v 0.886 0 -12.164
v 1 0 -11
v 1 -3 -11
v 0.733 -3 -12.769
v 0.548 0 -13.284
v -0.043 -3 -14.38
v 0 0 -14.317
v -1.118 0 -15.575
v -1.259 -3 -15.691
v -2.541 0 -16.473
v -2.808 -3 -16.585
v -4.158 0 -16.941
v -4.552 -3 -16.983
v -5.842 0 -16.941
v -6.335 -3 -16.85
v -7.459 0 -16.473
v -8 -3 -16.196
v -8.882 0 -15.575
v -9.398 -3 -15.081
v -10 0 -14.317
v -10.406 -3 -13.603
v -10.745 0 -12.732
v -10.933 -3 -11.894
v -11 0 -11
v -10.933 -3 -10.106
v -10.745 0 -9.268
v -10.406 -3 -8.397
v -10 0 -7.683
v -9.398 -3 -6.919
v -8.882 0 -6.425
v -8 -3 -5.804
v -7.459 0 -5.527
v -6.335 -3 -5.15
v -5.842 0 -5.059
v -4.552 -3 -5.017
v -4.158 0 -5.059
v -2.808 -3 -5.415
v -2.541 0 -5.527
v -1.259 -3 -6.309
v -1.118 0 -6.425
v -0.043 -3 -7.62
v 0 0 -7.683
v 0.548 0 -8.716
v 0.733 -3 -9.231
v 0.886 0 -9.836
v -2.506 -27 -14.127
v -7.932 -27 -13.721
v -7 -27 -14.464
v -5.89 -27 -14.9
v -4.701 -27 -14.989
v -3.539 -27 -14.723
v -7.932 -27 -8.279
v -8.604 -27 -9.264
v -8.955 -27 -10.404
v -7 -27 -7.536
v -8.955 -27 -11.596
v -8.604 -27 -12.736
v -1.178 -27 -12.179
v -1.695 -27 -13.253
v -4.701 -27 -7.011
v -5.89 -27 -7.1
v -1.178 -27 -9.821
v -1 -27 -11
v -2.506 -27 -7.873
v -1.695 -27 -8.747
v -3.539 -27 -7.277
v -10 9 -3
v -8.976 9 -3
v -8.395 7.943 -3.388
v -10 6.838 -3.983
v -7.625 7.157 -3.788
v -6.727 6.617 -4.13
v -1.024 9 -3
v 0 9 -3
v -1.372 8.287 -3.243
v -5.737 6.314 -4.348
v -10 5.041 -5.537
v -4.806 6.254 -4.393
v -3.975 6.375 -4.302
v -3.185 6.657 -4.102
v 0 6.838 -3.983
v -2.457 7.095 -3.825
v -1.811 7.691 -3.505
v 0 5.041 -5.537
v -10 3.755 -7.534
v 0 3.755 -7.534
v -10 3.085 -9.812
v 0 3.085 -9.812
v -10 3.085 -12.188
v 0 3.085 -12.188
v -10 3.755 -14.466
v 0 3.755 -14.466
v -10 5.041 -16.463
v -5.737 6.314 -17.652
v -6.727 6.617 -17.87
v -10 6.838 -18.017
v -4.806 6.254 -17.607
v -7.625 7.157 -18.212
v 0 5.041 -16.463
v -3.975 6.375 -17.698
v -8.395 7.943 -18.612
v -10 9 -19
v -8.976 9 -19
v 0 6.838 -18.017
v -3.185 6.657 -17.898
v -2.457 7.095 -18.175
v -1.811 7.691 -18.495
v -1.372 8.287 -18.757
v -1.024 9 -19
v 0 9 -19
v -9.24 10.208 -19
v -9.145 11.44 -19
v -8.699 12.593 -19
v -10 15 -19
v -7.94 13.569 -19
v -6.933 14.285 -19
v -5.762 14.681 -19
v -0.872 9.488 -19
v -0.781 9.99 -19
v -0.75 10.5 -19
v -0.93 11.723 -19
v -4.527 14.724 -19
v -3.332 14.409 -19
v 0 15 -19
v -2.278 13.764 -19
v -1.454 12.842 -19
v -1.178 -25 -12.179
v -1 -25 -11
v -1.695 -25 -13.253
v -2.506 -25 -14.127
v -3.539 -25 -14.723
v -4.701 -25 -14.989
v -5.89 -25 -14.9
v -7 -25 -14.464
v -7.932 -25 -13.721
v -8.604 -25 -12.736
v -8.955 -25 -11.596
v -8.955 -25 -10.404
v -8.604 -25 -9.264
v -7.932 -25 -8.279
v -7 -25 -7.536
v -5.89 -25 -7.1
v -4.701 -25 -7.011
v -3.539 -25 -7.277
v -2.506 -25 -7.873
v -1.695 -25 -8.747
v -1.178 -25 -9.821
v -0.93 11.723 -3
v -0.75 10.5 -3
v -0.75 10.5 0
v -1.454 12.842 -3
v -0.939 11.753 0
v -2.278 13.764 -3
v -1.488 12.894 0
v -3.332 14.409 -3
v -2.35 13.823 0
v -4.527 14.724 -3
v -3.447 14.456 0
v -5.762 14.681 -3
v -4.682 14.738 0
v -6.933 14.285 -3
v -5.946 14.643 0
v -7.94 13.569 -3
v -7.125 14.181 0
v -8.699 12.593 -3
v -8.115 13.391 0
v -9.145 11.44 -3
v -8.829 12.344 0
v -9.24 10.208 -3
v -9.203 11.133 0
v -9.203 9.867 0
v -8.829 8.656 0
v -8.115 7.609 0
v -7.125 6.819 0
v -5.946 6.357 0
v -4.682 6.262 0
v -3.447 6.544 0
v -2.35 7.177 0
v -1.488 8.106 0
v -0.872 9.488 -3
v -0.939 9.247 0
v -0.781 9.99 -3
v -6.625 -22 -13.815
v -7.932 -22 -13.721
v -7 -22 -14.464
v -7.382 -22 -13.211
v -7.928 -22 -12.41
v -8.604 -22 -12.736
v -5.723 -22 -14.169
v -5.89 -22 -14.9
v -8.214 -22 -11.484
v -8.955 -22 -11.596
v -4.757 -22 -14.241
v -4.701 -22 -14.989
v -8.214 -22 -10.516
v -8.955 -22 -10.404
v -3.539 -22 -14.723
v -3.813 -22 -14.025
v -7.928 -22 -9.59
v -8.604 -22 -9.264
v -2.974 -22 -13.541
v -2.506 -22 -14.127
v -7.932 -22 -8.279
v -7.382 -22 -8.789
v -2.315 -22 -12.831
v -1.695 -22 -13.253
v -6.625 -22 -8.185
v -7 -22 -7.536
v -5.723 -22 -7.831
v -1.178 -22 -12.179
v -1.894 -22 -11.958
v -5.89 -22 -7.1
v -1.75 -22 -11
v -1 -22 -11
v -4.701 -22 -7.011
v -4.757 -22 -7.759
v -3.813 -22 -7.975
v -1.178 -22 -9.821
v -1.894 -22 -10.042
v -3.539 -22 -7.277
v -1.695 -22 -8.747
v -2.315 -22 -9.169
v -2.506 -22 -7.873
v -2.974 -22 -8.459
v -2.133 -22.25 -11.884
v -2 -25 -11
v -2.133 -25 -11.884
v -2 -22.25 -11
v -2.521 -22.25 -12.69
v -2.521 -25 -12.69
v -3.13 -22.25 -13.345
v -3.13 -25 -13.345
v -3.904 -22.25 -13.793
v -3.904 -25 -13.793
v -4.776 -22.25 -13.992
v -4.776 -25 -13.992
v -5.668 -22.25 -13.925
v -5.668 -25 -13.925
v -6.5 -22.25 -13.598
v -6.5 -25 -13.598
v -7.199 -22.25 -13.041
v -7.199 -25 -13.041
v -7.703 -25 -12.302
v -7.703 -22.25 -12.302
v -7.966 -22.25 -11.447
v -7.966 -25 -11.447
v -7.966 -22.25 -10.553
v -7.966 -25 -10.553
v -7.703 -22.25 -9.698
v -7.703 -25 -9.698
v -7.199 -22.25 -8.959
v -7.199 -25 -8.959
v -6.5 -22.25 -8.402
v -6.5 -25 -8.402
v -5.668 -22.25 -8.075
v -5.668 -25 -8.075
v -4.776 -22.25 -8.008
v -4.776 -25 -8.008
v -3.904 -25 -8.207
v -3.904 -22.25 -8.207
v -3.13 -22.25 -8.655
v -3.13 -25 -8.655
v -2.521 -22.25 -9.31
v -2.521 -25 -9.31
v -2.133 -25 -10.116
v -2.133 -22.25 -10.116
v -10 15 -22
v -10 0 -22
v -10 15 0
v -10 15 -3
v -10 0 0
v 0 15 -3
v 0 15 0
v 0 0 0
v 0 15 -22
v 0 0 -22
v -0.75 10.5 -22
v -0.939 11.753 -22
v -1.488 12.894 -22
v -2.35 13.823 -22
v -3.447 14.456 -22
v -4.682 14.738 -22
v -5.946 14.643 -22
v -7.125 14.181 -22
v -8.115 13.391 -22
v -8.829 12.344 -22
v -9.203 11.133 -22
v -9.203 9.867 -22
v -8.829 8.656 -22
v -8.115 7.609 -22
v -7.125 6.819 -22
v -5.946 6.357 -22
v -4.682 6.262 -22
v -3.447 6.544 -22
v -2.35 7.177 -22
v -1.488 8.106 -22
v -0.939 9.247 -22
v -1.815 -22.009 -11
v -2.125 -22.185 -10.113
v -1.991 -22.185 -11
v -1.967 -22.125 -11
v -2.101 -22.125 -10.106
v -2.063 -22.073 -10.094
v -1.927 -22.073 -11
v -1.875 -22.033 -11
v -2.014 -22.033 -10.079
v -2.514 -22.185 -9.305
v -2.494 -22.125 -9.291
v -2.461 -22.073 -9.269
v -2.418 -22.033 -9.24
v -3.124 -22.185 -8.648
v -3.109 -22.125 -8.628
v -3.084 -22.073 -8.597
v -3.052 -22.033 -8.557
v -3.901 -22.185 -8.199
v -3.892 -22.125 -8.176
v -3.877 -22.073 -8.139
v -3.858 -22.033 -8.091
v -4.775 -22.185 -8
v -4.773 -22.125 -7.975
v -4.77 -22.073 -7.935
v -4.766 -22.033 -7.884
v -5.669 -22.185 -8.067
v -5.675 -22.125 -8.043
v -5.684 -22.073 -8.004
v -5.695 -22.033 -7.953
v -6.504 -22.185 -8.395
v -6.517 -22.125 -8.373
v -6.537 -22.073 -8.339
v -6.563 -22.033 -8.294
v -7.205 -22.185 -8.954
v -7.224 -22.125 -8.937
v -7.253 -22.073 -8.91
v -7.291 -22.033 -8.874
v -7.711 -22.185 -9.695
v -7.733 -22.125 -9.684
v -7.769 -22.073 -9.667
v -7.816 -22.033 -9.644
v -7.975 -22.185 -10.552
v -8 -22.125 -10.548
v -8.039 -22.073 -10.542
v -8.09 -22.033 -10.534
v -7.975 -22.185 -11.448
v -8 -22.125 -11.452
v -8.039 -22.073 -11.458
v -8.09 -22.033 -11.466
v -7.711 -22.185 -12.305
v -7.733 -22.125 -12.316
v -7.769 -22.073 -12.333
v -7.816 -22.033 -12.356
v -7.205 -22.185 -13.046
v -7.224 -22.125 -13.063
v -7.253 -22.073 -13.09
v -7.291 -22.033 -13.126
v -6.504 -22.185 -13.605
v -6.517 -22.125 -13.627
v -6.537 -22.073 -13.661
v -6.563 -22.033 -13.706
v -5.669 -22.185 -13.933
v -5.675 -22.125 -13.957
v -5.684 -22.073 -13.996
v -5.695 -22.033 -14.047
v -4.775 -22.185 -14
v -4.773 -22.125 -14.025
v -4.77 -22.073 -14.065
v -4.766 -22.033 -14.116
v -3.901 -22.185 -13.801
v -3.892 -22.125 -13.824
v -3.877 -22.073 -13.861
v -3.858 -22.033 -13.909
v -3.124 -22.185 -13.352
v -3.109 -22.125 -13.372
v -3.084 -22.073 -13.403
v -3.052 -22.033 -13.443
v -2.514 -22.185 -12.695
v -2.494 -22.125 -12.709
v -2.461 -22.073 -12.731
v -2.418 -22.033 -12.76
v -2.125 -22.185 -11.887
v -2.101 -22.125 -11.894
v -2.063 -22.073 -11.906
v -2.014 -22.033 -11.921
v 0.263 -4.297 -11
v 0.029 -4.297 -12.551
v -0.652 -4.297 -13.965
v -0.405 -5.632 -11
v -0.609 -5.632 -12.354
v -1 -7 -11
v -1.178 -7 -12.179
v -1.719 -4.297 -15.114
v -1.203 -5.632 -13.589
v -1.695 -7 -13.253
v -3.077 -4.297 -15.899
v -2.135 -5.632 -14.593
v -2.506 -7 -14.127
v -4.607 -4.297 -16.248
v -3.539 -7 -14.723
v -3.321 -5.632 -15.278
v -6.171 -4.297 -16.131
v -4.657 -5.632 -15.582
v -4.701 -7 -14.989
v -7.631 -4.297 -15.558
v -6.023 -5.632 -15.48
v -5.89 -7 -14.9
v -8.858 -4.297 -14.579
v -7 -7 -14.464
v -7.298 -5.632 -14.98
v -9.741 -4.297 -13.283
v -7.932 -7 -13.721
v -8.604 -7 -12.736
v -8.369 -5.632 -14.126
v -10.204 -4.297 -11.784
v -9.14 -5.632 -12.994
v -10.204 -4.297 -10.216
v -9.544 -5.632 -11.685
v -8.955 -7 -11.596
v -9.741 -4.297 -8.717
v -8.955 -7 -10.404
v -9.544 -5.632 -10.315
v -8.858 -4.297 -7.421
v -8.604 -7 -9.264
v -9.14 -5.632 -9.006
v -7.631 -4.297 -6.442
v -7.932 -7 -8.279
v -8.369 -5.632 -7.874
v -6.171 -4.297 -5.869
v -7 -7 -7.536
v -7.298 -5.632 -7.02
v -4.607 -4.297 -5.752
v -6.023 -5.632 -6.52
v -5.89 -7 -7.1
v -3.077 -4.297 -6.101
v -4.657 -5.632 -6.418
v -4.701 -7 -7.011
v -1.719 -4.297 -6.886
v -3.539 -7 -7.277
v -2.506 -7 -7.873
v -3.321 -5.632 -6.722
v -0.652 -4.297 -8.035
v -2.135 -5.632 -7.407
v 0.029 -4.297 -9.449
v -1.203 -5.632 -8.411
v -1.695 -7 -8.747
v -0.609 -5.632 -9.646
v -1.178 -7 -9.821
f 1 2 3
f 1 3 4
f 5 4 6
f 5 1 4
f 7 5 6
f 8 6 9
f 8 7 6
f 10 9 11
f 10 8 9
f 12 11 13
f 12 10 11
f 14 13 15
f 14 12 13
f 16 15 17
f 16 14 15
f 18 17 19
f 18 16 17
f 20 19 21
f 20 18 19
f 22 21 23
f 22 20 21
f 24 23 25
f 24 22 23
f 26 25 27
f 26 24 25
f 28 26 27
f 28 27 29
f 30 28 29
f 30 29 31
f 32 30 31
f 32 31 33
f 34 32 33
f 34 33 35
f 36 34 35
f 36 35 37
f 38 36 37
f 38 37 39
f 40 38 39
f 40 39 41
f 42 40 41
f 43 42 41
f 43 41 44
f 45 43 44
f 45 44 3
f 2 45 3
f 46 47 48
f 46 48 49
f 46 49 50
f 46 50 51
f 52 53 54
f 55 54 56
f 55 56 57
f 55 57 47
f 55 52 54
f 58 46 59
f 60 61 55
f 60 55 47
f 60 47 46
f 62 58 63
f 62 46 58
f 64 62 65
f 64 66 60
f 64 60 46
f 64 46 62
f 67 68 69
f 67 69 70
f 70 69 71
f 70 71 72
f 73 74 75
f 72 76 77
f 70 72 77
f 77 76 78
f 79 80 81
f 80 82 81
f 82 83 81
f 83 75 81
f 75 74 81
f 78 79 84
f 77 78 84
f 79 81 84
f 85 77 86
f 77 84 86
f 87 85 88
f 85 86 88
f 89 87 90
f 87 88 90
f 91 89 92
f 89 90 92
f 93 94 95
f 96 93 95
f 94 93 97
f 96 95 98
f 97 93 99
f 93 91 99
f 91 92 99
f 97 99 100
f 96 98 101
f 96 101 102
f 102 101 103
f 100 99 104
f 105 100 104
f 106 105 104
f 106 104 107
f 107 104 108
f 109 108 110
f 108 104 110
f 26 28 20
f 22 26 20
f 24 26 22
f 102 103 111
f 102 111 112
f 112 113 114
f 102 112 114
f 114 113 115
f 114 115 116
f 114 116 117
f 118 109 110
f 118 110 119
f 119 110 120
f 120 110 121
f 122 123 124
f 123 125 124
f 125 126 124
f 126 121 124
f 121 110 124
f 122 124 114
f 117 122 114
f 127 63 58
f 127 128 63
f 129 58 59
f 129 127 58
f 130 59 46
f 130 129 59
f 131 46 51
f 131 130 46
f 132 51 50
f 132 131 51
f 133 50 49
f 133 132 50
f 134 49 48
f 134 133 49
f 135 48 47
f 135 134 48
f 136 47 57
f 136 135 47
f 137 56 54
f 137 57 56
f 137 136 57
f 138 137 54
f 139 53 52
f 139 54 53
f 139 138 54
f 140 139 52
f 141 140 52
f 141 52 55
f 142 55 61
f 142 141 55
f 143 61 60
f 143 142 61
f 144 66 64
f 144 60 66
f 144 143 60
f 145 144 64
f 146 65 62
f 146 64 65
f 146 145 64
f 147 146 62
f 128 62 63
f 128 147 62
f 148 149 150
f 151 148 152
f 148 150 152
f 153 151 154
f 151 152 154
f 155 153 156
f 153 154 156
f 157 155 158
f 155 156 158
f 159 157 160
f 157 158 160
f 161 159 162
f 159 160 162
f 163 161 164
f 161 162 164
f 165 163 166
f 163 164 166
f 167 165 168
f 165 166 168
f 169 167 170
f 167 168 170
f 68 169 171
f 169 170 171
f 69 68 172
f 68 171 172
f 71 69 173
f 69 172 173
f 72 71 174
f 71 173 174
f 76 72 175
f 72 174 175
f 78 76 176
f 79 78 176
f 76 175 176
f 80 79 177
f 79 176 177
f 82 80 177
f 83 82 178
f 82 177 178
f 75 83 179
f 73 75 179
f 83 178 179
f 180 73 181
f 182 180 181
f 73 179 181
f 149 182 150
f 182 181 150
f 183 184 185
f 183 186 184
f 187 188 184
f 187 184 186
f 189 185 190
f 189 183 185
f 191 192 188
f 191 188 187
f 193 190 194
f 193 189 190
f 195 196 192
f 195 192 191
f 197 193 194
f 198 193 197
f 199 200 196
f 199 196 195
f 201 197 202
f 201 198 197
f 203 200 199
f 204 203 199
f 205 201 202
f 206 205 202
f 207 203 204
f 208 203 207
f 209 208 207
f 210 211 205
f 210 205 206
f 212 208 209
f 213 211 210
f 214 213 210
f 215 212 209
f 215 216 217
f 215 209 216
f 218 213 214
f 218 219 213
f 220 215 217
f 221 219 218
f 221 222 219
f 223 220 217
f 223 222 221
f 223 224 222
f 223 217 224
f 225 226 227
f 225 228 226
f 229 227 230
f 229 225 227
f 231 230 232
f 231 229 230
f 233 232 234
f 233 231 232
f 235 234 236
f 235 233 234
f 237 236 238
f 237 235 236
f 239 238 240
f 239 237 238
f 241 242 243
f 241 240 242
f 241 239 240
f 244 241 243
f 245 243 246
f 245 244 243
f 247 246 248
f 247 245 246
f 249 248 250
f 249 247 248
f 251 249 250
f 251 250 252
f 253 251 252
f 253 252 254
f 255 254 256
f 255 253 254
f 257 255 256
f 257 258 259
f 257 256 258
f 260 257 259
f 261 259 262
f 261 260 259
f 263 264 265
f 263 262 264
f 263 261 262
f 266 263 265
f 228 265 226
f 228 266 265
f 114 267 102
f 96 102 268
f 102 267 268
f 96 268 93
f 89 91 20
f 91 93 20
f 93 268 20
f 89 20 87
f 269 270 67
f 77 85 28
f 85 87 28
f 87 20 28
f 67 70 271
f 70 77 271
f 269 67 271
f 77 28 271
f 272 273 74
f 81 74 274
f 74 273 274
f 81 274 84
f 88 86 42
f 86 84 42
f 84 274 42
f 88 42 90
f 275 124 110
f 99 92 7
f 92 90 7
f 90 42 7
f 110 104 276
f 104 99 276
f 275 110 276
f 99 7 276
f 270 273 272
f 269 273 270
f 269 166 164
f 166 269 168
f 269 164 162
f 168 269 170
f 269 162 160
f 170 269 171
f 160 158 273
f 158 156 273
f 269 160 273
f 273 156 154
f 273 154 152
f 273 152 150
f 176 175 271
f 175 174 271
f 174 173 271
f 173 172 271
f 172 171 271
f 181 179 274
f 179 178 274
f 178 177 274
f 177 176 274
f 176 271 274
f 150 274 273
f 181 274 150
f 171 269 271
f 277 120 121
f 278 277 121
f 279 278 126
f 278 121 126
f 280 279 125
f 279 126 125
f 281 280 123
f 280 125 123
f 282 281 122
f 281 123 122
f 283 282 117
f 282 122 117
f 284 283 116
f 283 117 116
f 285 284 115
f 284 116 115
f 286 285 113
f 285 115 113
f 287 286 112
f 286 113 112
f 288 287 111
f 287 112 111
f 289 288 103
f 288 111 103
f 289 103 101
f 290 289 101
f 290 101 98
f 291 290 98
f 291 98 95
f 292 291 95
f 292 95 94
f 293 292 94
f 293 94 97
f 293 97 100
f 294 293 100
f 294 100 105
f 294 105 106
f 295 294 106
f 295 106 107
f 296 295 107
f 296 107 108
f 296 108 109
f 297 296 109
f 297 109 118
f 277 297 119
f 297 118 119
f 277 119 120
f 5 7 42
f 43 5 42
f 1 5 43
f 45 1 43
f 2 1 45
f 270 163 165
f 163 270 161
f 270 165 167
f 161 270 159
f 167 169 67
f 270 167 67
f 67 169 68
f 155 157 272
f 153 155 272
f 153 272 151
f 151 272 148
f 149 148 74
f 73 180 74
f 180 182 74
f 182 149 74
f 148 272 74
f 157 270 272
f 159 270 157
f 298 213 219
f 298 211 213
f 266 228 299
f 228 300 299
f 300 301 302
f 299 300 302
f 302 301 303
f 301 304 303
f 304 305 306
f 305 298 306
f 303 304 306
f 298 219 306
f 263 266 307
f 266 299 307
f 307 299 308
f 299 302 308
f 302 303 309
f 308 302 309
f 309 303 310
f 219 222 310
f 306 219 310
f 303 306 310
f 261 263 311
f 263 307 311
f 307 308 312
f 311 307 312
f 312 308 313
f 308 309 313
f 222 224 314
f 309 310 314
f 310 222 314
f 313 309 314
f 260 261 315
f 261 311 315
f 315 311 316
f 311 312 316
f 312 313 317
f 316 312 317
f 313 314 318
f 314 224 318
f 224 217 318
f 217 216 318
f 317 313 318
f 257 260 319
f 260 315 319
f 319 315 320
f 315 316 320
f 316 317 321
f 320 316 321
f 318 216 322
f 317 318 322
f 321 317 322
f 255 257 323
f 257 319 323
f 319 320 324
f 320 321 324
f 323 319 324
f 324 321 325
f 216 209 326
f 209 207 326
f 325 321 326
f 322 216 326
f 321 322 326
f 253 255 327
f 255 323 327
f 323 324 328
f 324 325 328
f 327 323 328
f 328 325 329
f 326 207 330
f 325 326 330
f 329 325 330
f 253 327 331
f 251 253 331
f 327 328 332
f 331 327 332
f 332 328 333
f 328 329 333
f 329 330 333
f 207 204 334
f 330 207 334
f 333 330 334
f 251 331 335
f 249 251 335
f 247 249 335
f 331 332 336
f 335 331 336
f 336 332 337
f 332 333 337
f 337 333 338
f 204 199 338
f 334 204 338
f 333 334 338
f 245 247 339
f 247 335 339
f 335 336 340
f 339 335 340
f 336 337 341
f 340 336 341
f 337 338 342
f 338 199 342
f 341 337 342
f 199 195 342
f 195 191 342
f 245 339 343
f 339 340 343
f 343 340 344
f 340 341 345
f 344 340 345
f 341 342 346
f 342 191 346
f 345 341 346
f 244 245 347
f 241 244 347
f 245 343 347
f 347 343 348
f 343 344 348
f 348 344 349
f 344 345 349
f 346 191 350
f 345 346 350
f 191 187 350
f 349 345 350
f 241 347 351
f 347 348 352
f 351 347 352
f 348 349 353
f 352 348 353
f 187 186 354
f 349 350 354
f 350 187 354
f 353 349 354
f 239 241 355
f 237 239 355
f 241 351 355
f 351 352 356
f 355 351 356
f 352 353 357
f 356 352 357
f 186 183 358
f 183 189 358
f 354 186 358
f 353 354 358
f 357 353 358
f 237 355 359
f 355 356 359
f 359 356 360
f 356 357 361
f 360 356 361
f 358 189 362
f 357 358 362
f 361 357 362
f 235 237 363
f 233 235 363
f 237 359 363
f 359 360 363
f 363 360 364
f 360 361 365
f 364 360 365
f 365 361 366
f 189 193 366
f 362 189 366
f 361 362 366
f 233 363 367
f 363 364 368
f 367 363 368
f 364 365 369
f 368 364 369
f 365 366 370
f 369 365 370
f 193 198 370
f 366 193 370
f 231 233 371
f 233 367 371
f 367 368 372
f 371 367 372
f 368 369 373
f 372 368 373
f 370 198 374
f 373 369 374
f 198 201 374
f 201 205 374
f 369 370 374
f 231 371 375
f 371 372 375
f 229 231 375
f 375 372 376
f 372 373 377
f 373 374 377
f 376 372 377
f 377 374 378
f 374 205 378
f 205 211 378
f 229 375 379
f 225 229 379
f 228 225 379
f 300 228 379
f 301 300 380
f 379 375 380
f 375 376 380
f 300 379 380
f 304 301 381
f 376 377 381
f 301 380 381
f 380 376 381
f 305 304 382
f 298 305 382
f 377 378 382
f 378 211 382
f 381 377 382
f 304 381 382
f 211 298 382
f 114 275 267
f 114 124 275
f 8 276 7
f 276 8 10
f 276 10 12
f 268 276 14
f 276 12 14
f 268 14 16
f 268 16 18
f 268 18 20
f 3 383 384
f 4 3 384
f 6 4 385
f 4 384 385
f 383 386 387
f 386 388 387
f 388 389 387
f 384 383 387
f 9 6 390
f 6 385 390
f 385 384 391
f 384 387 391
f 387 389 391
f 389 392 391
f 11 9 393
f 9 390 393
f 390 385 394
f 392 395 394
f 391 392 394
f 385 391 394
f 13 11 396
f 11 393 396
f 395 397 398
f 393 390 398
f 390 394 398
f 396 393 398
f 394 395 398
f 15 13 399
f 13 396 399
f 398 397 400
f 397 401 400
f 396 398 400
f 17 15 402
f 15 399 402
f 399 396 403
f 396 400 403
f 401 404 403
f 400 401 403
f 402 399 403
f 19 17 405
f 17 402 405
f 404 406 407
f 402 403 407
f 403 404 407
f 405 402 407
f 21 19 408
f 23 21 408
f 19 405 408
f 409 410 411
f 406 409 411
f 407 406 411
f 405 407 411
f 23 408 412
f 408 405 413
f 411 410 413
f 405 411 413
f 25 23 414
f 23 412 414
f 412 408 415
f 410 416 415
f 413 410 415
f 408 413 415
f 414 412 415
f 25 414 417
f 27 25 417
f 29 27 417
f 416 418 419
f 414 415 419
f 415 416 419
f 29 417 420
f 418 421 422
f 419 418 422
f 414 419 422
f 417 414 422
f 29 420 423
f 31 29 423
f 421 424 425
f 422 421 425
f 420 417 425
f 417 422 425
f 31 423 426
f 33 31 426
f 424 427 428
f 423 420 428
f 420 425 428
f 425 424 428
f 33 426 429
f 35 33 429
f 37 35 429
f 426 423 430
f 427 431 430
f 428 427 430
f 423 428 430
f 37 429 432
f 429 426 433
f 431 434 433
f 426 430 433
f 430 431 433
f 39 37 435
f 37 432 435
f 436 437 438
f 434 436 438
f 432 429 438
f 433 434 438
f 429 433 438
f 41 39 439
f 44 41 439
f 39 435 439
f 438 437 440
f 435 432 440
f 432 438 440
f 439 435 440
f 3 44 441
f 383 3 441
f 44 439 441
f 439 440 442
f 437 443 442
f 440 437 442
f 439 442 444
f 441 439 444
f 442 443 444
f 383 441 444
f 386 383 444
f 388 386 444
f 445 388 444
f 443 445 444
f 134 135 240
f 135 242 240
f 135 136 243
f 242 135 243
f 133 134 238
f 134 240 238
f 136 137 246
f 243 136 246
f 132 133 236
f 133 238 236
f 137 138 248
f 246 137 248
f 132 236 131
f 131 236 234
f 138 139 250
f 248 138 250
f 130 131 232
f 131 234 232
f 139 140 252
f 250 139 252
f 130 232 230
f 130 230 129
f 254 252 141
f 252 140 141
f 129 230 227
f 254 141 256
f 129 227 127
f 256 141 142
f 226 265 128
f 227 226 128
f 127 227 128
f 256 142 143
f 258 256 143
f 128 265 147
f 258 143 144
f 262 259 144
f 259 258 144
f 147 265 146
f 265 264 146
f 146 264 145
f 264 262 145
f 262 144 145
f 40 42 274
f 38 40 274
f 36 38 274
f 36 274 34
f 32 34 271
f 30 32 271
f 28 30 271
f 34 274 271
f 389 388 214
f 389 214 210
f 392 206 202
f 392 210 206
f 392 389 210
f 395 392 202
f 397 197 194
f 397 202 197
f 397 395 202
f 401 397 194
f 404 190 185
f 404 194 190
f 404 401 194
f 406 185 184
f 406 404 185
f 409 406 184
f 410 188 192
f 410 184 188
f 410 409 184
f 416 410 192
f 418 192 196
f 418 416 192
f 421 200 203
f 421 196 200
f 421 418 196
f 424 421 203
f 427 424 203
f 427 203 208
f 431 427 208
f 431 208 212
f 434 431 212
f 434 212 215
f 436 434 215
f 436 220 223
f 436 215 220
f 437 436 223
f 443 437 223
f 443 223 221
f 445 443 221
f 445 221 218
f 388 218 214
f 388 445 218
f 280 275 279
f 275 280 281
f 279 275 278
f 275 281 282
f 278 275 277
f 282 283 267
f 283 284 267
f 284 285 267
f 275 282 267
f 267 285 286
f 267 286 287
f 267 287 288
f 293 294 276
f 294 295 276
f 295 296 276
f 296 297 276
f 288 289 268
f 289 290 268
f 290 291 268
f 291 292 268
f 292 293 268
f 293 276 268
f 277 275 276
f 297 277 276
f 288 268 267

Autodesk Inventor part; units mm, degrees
ref_plane "YZ Plane" through (0, 0, 0) normal (1, 0, 0) x (0, 1, 0)
ref_plane "XZ Plane" through (0, 0, 0) normal (0, 1, 0) x (-1, 0, 0)
ref_plane "XY Plane" through (0, 0, 0) normal (0, 0, 1) x (1, 0, 0)
sketch "Sketch1" plane through (0, 0, 0) normal (0, 0, 1) x (1, 0, 0)
  point P0 (0, 0)
sketch "Sketch2" plane through (0, 0, 0) normal (0, 1, 0) x (-1, 0, 0)
  line L0 (0, 0) -> (0, -22)
  line L1 (0, -22) -> (10, -22)
  line L2 (10, -22) -> (10, 0)
  line L3 (10, 0) -> (0, 0)
  dimension "d0" = 22
  dimension "d1" = 10
extrude "Extrusion1" add sketch "Sketch2" along normal blind 15
sketch "Sketch5" plane through (0, 0, 0) normal (1, 0, 0) x (0, 0, -1)
  line L0 (0, 0) -> (22, 0) projected
  line L1 (22, 0) -> (22, 15) projected
  line L2 (0, 15) -> (22, 15) projected
  line L3 (0, 0) -> (0, 15) projected
  line L4 (22, 15) -> (0, 15) projected
  line L5 (0, 15) -> (3, 15)
  line L6 (22, 15) -> (19, 15)
  line L7 (22, 0) -> (0, 0) projected
  line L8 (11, 0) -> (11, 3)
  line L9 (3, 15) -> (3, 9)
  line L10 (3, 9) -> (19, 9)
  line L11 (19, 9) -> (19, 15)
  arc A0 (3, 9) -> (19, 9) centre (11, 11.3333) ccw
  dimension "d4" = 3
  dimension "d5" = 3
  dimension "d7" = 3
  dimension "d8" = 6
extrude "Extrusion2" cut sketch "Sketch5" against normal blind 17 contours A0 L10 | L2 L11 L10 L9
sketch "Sketch6" plane through (-10, 0, 0) normal (0, 0, 1) x (1, 0, 0)
  line L0 (0, 0) -> (10, 0) projected
  line L1 (10, 0) -> (10, 15) projected
  line L2 (0, 15) -> (10, 15) projected
  line L3 (0, 0) -> (0, 15) projected
  line L4 (0, 15) -> (10, 15) projected
  line L5 (5, 15) -> (5, 10.5)
  circle A0 centre (5, 10.5) radius 4.25
  dimension "d11" = 4.5
  dimension "d12" = 8.5
extrude "Extrusion3" cut sketch "Sketch6" against normal blind 31.25 contours A0
sketch "Sketch7" plane through (0, 0, 0) normal (0, -1, 0) x (1, 0, 0)
  line L0 (0, -22) -> (-10, -22) projected
  line L1 (0, 0) -> (0, -22) projected
  line L2 (-10, 0) -> (0, 0) projected
  line L3 (-10, -22) -> (-10, 0) projected
  line L4 (0, -3) -> (0, -19) projected
  circle A0 centre (-5, -11) radius 6
  dimension "d15" = 12
extrude "Extrusion4" add sketch "Sketch7" along normal blind 3 contours A0 L3 | L3 A0 L1 | L1 A0
sketch "Sketch8" plane through (-5, -3, -11) normal (0, -1, 0) x (1, 0, 0)
  circle A0 centre (0, 0) radius 6 projected
  circle A1 centre (0, 0) radius 4
  point P0 (5, 11)
  dimension "d18" = 8
extrude "Extrusion5" add sketch "Sketch8" along normal blind 4 contours A1
fillet "Fillet1" radius 28 1 edges at (-9, -3, -11)
sketch "Sketch11" plane through (-5, -7, -11) normal (0, -1, 0) x (1, 0, 0)
  circle A0 centre (0, 0) radius 4
  point P0 (5, 11)
extrude "Extrusion6" add sketch "Sketch11" along normal blind 15
sketch "Sketch12" plane through (-5, -22, -11) normal (0, -1, 0) x (1, 0, 0)
  circle A0 centre (0, 0) radius 3
  point P0 (5, 11)
  dimension "d24" = 6
extrude "Extrusion7" add sketch "Sketch12" along normal blind 3
sketch "Sketch13" plane through (-5, -25, -11) normal (0, -1, 0) x (1, 0, 0)
  circle A0 centre (0, 0) radius 4
  point P0 (5, 11)
extrude "Extrusion8" add sketch "Sketch13" along normal blind 2
fillet "Fillet2" radius 0.25 1 edges at (-8, -22, -11)
